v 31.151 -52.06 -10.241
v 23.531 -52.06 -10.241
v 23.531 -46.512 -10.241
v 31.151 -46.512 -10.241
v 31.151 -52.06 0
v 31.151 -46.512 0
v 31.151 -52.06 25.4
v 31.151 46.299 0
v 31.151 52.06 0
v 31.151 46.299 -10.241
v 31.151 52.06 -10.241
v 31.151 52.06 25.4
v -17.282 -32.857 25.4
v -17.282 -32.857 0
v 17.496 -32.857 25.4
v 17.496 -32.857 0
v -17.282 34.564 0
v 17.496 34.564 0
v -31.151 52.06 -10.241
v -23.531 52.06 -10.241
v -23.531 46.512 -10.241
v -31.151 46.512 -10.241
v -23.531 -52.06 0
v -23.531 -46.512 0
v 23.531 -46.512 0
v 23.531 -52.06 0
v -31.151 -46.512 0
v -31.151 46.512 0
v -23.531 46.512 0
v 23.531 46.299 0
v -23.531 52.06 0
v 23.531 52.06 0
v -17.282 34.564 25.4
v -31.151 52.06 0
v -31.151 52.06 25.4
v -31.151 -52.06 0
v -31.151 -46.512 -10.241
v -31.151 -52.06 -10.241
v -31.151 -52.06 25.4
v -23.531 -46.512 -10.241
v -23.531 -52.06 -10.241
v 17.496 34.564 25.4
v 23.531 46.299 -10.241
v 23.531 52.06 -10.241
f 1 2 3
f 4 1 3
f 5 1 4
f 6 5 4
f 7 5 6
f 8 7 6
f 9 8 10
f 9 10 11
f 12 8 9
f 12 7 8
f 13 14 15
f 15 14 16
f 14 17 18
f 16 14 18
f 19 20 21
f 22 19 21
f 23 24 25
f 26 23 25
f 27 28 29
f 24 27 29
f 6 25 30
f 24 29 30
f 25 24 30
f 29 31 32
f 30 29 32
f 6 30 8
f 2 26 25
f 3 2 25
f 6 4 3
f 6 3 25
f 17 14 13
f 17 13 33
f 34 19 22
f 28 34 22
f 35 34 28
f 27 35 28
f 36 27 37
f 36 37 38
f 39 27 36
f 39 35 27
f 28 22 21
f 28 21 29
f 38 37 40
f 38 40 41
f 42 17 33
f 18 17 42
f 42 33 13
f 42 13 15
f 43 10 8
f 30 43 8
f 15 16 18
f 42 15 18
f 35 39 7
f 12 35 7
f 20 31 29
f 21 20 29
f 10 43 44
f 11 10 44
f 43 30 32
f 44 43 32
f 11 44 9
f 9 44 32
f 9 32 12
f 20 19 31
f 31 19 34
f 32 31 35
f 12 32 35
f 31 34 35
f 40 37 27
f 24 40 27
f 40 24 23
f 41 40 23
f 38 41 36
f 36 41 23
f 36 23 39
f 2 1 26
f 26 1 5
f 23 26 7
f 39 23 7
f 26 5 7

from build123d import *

# Parameters (mm, degrees)
F2_W     = 62.3011216521
F2_H     = 104.1196808219
F3_DEPTH = 25.4
F0_W     = 34.7776822746
F0_H     = 67.4217604101
F4_W     = 5.5473595858
F4_H     = 10.2412803099
F4_W_2   = 5.760718137
F5_DEPTH = 7.62
F6_W     = 5.5473595858
F6_H     = 10.2412803099
F6_W_2   = 5.5473633111
F7_DEPTH = 7.62


with BuildPart() as f3:
    # F2 (on face) → F3 (new body)
    with BuildSketch(Plane.XY):
        Rectangle(F2_W, F2_H)
    extrude(amount=F3_DEPTH)

    # F4 (on face) → F5 (join)
    with BuildSketch(Plane.YZ.offset(31.1505608261)):
        with Locations((-49.2861606181, -5.1206401549)):
            Rectangle(F4_W, F4_H)
        with Locations((49.1794813424, -5.1206401549)):
            Rectangle(F4_W_2, F4_H)
    extrude(amount=-F5_DEPTH)

    # F6 (on face) → F7 (join)
    with BuildSketch(Plane(origin=(-31.1505608261, 0, 0), x_dir=(0, -1, 0), z_dir=(-1, 0, 0))):
        with Locations((-49.2861606181, -5.1206401549)):
            Rectangle(F6_W, F6_H)
        with Locations((49.2861587554, -5.1206401549)):
            Rectangle(F6_W_2, F6_H)
    extrude(amount=-F7_DEPTH)


with BuildPart() as f3b:
    # F0 (on Top) → F3, piece 2 (new body)
    with BuildSketch(Plane.XY):
        with Locations((0.1066811383, 0.853439793)):
            Rectangle(F0_W, F0_H)
    extrude(amount=F3_DEPTH)


solid = Compound([f3.part, f3b.part])
